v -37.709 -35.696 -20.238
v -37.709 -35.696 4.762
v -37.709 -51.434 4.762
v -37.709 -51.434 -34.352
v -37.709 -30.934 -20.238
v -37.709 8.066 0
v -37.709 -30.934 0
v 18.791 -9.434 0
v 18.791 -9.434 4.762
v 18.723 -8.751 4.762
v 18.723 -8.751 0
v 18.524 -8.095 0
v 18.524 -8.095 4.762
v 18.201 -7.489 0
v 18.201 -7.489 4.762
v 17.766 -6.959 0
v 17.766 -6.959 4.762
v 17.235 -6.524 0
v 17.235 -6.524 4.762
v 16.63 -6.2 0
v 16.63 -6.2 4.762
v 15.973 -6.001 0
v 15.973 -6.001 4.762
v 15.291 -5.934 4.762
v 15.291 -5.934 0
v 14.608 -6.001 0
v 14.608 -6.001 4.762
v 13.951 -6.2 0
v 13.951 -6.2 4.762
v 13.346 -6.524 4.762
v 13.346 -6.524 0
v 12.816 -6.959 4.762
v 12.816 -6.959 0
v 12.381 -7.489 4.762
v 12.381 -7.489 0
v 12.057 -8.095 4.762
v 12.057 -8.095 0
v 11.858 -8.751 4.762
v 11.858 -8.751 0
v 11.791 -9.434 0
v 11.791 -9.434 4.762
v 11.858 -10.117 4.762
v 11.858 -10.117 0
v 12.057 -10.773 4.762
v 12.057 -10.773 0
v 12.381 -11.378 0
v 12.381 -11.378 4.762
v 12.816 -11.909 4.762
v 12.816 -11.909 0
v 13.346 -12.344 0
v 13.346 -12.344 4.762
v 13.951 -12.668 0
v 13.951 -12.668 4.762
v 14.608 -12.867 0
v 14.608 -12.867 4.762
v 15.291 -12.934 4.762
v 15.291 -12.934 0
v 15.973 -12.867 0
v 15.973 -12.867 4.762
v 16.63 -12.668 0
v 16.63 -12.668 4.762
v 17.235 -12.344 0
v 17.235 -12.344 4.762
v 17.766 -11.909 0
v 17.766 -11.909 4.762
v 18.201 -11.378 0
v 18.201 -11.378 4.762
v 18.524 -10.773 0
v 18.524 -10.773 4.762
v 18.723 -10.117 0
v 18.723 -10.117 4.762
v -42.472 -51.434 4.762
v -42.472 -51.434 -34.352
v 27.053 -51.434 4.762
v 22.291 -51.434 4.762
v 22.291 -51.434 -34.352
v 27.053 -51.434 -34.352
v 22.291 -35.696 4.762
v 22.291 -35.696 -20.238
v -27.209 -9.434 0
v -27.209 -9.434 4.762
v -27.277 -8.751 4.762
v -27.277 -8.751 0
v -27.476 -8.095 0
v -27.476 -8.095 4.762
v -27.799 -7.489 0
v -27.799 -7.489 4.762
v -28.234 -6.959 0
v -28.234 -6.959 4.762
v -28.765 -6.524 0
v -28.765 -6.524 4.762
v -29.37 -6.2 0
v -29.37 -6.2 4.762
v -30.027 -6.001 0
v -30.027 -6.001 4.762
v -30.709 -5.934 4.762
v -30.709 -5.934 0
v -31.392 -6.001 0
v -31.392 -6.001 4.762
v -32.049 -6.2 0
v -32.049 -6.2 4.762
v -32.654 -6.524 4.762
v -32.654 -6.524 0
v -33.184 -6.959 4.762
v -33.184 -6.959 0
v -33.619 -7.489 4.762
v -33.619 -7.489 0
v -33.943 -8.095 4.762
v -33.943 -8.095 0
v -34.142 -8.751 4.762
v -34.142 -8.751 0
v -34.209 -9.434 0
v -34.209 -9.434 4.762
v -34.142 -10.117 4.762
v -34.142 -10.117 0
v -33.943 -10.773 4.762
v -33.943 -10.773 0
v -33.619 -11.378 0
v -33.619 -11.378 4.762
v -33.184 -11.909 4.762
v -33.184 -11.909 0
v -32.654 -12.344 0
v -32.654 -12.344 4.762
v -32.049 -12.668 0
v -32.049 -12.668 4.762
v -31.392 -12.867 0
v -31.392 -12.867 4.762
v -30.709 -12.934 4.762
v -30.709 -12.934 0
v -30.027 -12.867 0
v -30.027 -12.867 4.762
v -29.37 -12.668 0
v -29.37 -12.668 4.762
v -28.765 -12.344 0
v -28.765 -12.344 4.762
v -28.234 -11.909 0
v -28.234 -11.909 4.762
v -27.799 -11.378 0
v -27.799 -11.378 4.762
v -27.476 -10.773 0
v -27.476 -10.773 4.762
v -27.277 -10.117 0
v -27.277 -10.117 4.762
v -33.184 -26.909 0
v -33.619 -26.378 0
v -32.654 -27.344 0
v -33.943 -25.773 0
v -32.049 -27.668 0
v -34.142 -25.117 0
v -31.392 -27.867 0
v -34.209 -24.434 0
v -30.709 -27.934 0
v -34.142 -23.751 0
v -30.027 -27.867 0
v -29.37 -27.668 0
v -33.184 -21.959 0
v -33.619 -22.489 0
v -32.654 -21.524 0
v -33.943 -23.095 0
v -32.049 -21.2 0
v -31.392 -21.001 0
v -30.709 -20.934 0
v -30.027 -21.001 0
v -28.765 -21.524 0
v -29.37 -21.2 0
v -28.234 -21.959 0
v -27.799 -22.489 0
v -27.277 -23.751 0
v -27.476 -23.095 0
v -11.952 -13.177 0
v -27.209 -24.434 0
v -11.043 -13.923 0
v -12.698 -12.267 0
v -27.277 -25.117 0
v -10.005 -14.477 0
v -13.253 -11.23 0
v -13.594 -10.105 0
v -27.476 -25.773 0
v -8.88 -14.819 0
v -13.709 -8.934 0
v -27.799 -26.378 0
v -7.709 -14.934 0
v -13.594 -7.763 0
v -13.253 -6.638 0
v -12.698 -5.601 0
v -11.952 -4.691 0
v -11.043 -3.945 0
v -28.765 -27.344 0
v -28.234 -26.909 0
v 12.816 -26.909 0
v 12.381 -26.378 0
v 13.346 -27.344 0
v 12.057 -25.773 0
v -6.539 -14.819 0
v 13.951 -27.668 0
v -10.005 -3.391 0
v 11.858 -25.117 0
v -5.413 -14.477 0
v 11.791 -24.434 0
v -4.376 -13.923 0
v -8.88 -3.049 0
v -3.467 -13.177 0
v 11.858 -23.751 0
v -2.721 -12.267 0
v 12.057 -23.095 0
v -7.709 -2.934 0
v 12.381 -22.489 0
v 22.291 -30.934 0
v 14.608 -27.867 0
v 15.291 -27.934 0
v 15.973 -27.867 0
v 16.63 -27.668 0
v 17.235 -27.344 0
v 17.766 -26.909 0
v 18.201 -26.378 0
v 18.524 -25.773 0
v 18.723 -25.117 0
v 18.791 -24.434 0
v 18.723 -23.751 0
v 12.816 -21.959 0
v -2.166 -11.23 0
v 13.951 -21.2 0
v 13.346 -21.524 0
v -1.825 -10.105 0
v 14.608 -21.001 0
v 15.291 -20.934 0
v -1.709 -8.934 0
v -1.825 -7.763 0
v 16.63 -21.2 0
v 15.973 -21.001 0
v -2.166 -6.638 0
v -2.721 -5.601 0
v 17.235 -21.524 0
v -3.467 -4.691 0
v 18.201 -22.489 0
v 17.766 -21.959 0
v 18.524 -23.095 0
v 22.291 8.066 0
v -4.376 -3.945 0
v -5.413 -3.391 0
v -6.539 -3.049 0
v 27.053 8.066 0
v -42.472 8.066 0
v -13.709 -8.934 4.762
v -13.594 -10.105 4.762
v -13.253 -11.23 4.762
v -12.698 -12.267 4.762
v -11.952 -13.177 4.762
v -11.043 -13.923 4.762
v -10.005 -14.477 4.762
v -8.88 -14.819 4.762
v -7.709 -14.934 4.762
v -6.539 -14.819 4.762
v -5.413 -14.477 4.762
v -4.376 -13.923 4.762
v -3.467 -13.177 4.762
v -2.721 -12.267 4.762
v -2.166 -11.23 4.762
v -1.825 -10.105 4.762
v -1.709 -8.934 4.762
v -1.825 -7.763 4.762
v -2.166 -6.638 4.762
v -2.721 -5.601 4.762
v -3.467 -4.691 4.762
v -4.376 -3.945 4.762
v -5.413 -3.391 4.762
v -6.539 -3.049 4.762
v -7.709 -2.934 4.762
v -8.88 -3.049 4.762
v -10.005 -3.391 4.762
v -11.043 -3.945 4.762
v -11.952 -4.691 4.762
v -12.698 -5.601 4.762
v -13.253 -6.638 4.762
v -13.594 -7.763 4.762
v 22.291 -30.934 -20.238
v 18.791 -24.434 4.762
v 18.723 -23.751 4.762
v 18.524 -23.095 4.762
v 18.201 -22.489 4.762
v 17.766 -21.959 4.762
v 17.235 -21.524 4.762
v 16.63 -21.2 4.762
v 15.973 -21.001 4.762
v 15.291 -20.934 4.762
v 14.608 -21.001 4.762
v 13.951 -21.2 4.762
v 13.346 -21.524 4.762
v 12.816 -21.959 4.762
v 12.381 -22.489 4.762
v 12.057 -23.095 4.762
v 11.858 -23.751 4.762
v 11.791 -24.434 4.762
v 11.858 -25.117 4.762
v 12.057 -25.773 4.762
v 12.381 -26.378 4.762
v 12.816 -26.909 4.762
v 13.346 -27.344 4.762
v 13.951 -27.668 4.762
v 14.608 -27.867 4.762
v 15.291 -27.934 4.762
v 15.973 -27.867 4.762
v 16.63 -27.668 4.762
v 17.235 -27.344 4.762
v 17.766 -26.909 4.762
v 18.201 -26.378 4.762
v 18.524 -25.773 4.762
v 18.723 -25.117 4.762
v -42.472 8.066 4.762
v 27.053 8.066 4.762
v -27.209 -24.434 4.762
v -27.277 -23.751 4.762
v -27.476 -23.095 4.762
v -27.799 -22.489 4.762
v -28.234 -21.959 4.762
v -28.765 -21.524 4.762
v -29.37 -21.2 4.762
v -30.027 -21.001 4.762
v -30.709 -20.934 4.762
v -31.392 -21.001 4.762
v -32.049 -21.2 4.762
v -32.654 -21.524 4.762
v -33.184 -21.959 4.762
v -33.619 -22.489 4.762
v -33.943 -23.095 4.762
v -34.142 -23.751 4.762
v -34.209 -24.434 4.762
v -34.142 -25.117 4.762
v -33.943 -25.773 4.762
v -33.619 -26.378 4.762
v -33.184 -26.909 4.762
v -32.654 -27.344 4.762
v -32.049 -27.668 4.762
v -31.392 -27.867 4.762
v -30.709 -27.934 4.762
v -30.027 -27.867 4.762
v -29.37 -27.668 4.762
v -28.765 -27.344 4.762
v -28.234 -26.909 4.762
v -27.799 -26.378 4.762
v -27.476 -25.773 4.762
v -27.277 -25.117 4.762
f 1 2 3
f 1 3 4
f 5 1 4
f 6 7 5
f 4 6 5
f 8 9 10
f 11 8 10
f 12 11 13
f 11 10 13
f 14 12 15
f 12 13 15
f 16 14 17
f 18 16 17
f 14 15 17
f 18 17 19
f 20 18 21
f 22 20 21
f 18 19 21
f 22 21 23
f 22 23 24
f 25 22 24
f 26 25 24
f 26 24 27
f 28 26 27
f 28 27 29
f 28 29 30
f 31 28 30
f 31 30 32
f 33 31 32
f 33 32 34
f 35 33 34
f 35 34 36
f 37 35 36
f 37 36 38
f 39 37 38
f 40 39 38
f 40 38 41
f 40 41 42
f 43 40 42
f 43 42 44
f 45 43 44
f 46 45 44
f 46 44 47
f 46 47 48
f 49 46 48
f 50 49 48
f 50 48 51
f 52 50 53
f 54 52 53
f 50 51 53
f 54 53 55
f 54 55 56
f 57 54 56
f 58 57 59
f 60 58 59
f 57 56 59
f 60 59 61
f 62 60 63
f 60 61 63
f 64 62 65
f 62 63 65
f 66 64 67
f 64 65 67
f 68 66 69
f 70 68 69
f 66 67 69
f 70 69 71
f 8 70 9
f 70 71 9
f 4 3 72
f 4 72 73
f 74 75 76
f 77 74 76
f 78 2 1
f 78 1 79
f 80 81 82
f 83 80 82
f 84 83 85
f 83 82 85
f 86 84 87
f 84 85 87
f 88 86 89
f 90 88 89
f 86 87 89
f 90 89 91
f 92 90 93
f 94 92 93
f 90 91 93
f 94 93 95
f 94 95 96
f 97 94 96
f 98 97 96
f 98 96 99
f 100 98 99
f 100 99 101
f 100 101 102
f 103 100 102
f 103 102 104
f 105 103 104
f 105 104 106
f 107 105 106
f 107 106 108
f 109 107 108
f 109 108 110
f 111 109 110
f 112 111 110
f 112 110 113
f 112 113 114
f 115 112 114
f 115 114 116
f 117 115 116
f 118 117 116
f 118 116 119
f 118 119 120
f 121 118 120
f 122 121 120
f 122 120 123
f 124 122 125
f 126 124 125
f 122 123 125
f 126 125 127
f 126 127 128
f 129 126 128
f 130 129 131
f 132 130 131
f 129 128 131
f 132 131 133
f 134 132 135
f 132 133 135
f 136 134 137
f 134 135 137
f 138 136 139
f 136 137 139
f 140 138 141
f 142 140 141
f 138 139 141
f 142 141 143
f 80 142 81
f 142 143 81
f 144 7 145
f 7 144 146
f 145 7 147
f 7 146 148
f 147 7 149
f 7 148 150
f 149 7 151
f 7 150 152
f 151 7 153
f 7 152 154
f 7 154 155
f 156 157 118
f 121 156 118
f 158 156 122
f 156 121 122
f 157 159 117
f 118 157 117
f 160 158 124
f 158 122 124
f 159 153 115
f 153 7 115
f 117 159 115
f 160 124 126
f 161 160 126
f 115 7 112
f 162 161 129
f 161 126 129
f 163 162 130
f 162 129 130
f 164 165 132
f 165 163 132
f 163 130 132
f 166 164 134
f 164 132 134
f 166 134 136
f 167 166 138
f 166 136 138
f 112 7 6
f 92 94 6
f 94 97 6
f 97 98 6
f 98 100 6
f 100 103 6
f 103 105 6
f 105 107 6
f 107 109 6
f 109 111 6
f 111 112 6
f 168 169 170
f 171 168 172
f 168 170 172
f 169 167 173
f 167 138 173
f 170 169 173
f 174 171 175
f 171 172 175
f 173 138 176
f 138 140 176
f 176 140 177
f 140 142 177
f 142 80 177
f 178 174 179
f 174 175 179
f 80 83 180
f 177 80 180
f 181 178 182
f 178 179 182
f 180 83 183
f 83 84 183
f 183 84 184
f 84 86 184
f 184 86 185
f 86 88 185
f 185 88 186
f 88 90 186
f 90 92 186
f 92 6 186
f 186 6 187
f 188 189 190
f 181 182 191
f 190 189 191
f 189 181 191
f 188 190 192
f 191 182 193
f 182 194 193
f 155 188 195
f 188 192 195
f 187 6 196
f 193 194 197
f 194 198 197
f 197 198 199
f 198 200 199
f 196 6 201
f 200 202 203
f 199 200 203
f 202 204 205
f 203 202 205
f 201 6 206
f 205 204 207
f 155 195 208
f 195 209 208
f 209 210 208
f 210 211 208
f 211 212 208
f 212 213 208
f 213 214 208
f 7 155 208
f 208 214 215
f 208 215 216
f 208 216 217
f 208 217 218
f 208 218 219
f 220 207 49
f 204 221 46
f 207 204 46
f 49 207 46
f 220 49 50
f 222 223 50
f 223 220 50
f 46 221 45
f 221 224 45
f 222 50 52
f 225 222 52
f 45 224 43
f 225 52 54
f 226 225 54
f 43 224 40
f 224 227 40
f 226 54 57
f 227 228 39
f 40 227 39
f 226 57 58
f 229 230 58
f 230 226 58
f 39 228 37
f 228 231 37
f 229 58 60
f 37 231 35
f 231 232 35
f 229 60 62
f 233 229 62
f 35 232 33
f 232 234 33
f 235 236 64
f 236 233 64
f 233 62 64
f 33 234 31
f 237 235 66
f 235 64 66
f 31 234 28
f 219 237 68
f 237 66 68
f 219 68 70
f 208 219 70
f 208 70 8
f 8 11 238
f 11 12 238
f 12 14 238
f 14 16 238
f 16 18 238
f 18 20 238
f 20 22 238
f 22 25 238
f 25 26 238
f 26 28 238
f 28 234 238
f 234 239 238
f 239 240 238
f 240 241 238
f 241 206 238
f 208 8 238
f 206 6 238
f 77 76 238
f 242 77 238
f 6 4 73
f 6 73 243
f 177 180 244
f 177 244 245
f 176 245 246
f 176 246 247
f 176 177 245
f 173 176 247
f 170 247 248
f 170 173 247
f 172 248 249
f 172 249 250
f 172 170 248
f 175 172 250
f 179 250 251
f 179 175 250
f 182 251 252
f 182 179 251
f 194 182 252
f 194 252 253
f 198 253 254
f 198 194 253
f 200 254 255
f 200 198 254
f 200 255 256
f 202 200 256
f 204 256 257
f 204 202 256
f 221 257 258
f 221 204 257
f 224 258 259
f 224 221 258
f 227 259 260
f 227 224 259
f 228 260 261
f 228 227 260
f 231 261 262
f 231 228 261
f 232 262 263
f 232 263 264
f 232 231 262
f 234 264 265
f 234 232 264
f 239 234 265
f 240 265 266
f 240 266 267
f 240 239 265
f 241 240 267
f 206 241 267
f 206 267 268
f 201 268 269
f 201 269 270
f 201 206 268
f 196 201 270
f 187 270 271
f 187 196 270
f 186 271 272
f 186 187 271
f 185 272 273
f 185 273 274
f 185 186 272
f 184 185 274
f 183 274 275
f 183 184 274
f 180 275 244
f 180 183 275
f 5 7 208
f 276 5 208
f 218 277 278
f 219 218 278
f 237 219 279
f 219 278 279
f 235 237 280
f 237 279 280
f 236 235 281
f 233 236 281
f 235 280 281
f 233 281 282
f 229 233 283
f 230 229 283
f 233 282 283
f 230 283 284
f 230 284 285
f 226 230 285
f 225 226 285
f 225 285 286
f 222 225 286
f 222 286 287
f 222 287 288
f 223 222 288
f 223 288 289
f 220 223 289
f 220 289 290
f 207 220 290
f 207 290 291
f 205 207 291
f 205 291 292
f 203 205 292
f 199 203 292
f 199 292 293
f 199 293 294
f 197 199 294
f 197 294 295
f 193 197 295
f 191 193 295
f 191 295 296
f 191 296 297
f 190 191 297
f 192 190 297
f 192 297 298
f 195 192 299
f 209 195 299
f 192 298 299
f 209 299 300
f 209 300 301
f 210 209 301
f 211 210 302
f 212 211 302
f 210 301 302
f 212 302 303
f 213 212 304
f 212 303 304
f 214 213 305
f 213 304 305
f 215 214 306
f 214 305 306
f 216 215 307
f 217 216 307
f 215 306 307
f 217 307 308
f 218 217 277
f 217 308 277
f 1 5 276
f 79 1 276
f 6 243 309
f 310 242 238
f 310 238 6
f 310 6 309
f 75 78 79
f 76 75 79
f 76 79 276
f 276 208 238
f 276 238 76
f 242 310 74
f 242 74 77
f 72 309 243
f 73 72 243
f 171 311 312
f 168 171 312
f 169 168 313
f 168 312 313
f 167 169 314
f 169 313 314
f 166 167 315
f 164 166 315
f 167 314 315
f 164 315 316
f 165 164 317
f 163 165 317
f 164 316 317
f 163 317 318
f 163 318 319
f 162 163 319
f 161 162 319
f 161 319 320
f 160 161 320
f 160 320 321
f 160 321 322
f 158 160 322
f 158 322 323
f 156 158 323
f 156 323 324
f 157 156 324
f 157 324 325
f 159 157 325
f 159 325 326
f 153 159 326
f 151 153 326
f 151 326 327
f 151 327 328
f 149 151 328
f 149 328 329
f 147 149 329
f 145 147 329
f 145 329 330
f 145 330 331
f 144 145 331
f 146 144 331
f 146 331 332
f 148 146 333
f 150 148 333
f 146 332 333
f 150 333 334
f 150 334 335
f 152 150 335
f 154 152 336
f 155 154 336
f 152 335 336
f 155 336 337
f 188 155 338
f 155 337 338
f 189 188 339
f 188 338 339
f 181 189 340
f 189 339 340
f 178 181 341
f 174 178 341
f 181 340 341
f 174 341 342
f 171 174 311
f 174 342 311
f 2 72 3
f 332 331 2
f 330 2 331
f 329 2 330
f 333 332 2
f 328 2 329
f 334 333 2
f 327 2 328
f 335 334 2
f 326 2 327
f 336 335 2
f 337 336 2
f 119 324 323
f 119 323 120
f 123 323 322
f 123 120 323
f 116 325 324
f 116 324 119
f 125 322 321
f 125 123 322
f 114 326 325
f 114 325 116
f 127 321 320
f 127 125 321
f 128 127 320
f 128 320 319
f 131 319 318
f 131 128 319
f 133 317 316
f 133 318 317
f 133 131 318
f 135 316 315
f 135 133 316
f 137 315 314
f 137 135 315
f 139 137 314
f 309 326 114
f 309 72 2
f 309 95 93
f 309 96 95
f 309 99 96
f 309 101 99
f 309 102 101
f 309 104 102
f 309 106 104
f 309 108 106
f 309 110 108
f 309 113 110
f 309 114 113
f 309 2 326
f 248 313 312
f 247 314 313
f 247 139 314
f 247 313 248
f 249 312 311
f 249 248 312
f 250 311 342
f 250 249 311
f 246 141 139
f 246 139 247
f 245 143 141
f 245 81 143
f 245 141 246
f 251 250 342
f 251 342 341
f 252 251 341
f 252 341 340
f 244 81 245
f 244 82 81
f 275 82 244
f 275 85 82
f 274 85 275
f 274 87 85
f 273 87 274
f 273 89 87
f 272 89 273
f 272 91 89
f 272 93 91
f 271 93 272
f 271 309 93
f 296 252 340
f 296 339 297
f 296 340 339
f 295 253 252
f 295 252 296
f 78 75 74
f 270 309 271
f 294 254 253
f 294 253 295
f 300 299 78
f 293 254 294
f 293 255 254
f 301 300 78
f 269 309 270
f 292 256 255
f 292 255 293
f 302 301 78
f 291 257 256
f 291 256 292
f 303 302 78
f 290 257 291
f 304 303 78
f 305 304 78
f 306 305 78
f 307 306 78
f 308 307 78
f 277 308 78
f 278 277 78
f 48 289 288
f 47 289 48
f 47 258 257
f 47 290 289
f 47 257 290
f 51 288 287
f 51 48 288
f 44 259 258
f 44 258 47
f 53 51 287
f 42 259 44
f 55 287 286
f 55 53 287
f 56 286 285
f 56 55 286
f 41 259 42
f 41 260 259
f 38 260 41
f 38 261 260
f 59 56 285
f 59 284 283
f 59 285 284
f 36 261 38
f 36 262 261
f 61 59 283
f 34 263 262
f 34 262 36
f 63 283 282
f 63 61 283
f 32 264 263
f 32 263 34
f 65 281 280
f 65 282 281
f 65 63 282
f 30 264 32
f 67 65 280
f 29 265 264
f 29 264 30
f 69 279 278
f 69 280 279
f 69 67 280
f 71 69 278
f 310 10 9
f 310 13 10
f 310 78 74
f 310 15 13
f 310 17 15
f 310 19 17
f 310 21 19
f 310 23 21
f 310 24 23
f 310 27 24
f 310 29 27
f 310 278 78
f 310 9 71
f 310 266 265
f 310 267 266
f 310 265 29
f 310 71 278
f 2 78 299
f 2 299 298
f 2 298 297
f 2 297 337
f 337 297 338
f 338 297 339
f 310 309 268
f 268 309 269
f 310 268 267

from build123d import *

# Parameters (mm, degrees)
CROQUIS1_W              = 60
CROQUIS1_H              = 39
CROQUIS1_R              = 6
SALIENTE_EXTRUIR1_DEPTH = 4.7625
SALIENTE_EXTRUIR2_DEPTH = 4.7625
SALIENTE_EXTRUIR3_START = -60
SALIENTE_EXTRUIR3_DEPTH = 4.7625
CROQUIS4_W              = 60
CROQUIS4_H              = 4.7625
SALIENTE_EXTRUIR4_DEPTH = 25
CROQUIS5_R              = 3.5
CORTAR_EXTRUIR1_DEPTH   = 10


with BuildPart() as part:
    # Croquis1 → Saliente-Extruir1 (new body)
    with BuildSketch(Plane.XY):
        with Locations((-7.709348333, -11.433962264)):
            Rectangle(CROQUIS1_W, CROQUIS1_H)
        with Locations(Location((-7.709348333, -8.933962264, 0), (0, 0, 180))):
            Circle(CROQUIS1_R, mode=Mode.SUBTRACT)
    extrude(amount=SALIENTE_EXTRUIR1_DEPTH)

    # Croquis2 → Saliente-Extruir2 (add)
    with BuildSketch(Plane(origin=(22.290651667, 0, 0), x_dir=(0, 0, -1), z_dir=(1, 0, 0))):
        Polygon((-4.7625, 8.066037736), (-4.7625, -51.433962264), (34.352341017, -51.433962264), (0, 8.066037736), align=None)
    extrude(amount=SALIENTE_EXTRUIR2_DEPTH)

    # Croquis2<2> → Saliente-Extruir3 (add)
    with BuildSketch(Plane(origin=(22.290651667, 0, 0), x_dir=(0, 0, -1), z_dir=(1, 0, 0)).offset(SALIENTE_EXTRUIR3_START)):
        Polygon((-4.7625, 8.066037736), (-4.7625, -51.433962264), (34.352341017, -51.433962264), (0, 8.066037736), align=None)
    extrude(amount=-SALIENTE_EXTRUIR3_DEPTH)

    # Croquis4 → Saliente-Extruir4 (add)
    with BuildSketch(Plane.XY.offset(4.7625)):
        with Locations((-7.709348333, -33.315212264)):
            Rectangle(CROQUIS4_W, CROQUIS4_H)
    extrude(amount=-SALIENTE_EXTRUIR4_DEPTH)

    # Croquis5 → Cortar-Extruir1 (cut)
    with BuildSketch(Plane.XY.offset(4.7625)):
        with Locations((-30.709348333, -9.433962264)):
            Circle(CROQUIS5_R)
        with Locations((15.290651667, -9.433962264)):
            Circle(CROQUIS5_R)
        with Locations((15.290651667, -24.433962264)):
            Circle(CROQUIS5_R)
        with Locations((-30.709348333, -24.433962264)):
            Circle(CROQUIS5_R)
    extrude(amount=-CORTAR_EXTRUIR1_DEPTH, mode=Mode.SUBTRACT)


solid = part.part
